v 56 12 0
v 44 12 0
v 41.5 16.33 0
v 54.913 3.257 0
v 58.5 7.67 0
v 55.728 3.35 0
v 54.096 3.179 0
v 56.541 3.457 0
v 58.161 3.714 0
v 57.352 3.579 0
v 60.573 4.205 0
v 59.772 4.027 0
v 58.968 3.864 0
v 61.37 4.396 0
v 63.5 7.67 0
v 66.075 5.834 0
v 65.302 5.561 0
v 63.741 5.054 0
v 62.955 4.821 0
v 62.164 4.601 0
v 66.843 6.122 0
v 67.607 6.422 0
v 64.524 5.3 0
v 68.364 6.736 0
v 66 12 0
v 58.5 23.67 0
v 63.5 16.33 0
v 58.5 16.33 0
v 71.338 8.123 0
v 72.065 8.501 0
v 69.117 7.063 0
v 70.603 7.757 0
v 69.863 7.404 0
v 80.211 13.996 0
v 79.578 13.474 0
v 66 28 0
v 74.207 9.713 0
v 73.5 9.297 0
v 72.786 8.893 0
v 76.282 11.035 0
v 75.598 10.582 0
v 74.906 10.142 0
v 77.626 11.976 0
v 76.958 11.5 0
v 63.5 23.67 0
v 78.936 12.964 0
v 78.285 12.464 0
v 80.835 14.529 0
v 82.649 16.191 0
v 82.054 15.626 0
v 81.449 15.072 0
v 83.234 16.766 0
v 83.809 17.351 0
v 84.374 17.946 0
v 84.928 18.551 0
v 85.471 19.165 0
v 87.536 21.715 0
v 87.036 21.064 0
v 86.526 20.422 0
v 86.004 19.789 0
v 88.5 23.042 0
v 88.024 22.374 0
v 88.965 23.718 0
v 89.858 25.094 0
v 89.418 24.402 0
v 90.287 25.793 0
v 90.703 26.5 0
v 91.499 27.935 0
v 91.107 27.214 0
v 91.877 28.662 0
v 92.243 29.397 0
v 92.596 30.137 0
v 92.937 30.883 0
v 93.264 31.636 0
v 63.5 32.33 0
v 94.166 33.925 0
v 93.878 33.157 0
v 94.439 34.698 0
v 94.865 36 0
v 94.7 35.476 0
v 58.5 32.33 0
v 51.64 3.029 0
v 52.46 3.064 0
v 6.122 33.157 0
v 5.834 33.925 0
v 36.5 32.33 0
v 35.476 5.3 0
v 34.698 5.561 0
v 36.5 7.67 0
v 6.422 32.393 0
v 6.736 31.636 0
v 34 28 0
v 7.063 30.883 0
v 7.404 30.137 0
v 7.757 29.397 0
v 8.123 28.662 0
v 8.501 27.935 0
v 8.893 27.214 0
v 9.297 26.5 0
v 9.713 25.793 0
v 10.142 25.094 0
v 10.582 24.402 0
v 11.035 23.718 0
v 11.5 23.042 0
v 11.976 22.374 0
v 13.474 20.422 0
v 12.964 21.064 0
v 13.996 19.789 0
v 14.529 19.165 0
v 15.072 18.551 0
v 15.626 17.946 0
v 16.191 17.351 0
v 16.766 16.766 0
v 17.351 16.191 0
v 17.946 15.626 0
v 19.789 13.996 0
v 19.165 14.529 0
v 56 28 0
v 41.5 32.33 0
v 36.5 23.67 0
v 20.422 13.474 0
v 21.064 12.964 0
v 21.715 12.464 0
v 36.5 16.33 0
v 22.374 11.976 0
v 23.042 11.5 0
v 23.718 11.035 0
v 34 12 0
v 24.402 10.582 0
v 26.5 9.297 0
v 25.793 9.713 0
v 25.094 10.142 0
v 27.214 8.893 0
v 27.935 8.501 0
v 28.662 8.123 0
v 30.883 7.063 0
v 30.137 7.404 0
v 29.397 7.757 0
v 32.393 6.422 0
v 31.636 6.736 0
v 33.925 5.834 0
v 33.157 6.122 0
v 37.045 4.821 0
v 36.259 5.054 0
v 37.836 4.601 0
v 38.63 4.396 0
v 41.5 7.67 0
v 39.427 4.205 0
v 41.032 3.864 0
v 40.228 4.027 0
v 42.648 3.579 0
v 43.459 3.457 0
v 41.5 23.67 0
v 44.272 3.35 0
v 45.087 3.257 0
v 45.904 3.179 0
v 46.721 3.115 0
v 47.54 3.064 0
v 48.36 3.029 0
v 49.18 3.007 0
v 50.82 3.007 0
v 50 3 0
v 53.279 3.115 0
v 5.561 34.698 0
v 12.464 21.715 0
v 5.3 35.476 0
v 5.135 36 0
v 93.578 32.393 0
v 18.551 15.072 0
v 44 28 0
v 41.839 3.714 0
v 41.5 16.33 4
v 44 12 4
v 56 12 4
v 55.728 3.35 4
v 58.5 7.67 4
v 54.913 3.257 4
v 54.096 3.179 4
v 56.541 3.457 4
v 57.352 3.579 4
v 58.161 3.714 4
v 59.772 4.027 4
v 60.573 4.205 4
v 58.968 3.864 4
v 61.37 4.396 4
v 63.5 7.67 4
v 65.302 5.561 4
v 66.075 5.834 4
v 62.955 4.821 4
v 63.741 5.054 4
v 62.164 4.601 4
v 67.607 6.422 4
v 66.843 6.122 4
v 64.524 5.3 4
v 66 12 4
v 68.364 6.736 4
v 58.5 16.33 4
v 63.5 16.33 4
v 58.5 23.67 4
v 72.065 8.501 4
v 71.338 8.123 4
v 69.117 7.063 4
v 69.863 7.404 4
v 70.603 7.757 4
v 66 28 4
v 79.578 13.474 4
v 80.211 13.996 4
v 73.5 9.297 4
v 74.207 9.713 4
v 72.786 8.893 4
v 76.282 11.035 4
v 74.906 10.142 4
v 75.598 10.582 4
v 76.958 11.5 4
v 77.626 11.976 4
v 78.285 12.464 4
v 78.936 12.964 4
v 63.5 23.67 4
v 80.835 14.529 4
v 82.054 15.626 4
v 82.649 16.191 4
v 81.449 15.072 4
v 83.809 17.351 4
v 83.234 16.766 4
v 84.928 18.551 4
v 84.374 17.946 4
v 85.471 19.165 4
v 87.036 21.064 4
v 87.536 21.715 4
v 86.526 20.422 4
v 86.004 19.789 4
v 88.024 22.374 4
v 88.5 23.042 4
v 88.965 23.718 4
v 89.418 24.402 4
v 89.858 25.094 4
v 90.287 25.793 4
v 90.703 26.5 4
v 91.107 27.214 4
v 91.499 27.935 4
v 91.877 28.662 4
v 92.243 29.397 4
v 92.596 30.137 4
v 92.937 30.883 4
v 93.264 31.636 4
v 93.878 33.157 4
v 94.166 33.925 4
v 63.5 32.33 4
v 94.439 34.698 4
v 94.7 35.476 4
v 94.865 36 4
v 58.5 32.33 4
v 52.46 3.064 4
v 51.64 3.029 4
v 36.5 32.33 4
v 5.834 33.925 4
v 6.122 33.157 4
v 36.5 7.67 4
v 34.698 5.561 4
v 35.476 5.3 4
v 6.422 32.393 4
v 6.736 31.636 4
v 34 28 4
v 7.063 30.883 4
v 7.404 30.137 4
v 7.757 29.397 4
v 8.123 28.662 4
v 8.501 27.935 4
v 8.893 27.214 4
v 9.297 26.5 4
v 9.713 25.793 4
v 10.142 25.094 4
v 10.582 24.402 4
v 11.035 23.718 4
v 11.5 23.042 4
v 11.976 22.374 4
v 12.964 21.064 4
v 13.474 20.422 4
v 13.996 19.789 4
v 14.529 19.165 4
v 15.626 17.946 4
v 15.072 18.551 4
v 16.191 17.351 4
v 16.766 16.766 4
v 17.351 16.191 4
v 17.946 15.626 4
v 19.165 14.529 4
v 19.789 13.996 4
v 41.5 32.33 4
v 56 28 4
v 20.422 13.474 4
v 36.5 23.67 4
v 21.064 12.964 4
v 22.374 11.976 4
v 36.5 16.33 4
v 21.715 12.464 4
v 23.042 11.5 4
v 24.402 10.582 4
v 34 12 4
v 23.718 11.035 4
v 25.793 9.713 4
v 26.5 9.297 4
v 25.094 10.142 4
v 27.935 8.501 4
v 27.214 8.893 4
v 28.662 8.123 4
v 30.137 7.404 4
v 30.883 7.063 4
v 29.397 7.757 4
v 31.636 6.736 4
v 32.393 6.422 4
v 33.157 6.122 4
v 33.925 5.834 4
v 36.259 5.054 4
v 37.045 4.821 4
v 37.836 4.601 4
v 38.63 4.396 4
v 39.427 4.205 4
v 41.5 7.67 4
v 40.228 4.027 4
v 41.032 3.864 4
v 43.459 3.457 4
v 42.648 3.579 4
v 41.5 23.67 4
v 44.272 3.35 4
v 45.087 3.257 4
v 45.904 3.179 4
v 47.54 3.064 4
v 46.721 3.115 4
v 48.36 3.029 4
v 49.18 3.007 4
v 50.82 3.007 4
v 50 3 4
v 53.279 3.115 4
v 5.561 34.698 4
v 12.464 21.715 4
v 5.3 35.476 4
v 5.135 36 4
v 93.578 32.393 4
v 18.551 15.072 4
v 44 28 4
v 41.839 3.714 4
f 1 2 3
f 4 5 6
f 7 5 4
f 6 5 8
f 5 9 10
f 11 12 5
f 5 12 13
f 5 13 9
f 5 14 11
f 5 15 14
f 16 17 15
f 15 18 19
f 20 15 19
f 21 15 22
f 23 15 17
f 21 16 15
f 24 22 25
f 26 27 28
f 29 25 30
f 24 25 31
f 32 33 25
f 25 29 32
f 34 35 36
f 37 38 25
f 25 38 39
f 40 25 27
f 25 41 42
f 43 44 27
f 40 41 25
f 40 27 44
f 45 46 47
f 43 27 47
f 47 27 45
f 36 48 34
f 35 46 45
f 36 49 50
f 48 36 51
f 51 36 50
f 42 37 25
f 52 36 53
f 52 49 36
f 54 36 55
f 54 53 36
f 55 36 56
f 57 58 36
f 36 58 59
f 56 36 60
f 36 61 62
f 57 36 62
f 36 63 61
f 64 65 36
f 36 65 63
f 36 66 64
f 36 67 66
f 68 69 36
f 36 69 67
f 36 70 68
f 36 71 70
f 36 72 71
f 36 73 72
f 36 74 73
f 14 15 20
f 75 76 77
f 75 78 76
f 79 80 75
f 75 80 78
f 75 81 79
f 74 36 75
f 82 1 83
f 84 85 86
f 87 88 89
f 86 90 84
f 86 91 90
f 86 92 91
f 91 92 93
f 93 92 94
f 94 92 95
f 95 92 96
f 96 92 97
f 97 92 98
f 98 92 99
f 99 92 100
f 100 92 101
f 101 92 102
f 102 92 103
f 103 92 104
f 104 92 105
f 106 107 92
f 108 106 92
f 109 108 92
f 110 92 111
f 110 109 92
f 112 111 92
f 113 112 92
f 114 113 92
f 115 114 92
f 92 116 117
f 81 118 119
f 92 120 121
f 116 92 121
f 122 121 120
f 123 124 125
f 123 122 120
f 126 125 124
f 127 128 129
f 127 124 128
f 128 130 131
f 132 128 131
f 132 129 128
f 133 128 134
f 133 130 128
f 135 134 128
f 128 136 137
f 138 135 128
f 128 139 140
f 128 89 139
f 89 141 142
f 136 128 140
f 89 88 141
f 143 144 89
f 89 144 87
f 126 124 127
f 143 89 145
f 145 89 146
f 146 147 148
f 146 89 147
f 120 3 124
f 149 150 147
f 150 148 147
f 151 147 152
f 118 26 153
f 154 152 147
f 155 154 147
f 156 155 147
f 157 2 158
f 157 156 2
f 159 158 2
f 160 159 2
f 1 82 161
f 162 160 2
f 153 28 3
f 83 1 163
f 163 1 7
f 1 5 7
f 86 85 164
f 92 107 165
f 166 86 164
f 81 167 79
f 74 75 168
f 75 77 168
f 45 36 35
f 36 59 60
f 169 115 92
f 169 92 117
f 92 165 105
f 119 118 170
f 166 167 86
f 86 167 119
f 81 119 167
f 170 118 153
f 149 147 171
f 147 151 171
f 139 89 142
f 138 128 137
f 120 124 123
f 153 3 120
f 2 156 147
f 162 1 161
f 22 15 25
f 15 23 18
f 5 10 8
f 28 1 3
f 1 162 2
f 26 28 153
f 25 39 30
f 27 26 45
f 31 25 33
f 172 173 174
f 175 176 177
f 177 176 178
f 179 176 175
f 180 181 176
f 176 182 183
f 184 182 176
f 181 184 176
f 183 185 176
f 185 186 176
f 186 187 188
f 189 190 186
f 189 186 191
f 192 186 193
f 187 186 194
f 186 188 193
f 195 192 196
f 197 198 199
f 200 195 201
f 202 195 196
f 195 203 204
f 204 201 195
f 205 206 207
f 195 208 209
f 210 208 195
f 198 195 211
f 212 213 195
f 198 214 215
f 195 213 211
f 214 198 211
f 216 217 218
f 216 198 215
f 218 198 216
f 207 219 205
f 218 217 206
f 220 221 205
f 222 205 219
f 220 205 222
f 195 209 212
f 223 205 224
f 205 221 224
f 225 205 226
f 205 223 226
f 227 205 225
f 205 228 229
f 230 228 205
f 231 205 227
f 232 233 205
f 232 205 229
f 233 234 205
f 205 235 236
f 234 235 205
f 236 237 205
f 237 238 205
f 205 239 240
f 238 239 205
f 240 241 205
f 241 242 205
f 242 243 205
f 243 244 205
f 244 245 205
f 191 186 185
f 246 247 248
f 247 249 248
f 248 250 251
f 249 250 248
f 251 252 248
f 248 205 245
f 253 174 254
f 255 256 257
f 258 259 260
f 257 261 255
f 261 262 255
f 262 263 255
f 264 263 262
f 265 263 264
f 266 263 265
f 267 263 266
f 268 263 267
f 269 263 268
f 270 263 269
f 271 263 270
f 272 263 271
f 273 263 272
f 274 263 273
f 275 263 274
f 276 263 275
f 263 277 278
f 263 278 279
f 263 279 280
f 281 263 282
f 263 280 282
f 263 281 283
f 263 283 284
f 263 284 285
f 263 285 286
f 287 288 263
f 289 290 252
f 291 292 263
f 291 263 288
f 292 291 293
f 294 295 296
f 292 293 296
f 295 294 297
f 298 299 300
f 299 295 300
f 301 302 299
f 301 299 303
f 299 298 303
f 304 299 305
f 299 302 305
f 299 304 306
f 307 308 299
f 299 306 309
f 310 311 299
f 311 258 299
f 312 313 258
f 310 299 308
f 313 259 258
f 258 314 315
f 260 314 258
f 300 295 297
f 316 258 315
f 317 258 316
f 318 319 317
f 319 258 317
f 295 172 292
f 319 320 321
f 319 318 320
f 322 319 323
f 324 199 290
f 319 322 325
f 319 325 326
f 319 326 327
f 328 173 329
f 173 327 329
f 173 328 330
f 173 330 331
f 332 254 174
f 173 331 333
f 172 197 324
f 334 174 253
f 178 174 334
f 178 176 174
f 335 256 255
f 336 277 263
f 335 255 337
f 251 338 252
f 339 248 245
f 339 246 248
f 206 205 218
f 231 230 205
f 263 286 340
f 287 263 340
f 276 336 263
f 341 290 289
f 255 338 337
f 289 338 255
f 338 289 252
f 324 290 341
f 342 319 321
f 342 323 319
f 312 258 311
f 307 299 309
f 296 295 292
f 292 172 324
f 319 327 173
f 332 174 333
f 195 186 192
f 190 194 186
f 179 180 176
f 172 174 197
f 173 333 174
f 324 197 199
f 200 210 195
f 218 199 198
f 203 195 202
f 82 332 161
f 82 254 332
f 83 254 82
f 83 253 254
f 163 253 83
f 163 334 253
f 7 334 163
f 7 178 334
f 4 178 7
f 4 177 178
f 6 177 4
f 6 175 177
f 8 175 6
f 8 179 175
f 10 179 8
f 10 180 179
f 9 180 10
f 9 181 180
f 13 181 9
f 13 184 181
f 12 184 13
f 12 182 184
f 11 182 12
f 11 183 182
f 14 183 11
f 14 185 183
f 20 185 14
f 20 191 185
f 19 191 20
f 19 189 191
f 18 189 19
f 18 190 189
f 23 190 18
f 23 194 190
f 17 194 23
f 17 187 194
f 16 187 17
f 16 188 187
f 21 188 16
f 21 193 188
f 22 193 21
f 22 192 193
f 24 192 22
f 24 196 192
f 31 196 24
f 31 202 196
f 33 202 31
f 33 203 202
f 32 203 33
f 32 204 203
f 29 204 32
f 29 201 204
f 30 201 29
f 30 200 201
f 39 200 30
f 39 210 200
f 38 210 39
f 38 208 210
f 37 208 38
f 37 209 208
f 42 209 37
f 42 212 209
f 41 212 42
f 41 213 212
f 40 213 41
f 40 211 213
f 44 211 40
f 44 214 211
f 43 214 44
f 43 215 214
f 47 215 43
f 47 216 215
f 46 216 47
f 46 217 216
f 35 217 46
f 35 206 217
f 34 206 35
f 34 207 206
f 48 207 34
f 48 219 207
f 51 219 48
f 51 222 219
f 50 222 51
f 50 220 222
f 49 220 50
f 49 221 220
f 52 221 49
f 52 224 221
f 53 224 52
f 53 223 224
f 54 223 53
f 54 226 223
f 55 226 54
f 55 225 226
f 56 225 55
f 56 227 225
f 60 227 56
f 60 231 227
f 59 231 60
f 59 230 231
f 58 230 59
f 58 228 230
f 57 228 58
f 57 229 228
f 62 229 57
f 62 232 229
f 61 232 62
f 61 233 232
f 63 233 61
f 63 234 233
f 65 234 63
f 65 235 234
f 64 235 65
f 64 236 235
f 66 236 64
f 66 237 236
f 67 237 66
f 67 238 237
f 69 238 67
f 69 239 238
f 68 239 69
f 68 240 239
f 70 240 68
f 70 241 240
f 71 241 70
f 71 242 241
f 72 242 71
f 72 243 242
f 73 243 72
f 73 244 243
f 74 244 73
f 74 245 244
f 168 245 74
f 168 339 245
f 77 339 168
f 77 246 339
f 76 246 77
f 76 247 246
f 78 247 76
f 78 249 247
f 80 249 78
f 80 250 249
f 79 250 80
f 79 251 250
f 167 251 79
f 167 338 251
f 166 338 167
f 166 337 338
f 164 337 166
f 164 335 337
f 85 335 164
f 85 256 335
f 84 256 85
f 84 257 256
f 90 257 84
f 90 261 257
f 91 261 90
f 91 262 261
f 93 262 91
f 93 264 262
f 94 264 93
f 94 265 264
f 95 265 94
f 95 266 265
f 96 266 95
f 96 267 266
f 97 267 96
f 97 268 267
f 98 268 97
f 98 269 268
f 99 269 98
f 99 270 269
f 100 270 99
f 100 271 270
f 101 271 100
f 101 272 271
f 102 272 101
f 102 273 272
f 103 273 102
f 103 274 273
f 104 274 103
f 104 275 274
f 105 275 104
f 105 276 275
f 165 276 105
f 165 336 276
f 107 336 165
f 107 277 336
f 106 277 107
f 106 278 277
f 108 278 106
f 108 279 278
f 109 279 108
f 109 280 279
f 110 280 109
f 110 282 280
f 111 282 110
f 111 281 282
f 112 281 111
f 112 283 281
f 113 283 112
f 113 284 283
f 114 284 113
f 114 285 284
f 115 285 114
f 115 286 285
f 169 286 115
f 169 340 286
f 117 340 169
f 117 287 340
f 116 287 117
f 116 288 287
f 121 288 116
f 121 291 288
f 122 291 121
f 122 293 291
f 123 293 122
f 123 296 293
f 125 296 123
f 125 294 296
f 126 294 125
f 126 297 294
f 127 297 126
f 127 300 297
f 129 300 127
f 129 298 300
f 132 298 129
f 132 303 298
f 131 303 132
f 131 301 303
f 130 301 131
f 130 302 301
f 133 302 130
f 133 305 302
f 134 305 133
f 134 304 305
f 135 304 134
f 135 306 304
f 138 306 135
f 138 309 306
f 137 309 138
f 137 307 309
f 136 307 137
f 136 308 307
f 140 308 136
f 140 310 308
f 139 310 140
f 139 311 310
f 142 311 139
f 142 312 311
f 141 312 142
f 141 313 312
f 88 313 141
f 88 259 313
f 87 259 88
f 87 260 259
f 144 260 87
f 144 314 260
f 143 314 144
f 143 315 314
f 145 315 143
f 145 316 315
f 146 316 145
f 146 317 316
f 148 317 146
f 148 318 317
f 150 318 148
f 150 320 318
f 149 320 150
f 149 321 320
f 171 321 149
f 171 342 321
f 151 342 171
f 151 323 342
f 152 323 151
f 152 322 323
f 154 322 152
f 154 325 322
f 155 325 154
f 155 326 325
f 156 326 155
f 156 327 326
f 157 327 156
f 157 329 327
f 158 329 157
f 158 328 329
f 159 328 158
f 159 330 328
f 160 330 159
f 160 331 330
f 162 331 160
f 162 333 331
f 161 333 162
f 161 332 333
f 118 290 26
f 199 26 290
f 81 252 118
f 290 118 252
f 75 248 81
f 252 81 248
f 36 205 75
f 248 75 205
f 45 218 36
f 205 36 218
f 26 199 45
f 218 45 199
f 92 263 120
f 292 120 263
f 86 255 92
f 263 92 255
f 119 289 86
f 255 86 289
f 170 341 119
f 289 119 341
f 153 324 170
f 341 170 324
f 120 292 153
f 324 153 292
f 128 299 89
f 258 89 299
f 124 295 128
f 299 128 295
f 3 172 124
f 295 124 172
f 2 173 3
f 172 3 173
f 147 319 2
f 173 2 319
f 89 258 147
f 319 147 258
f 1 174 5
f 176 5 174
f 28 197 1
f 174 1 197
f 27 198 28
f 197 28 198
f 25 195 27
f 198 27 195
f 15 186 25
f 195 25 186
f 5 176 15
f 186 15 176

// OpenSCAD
// file: 1A.1.scad
/* Copyright 2018 Guillaume JORANDON
 * 
 * This file is distributed under the terms of the MIT License.
 * Check https://opensource.org/licenses/MIT for more details.
 * 
 * ./front_core/1A.1.scad: back plate attached to the front of the rear core.
 *
 * quantity: 1
 * NB.: units are assumed to be millimeters.
 */

include <../globals.scad>
include <globals.scad>

module front_core_lip() {
    translate([-front_core_width/2, 0, 0]) {
        square([front_core_lip_reduction/2 + front_core_lip_inner_slope, front_core_partial_height-(front_core_width/2)]);
        translate([0, front_core_partial_height-(front_core_width/2), 0]) {
            polygon([[0, 0], [front_core_lip_reduction/2, 0], [front_core_lip_reduction/2, front_core_lip_height]]);
            polygon([[front_core_lip_reduction/2, 0], [front_core_lip_reduction/2 + front_core_lip_inner_slope, 0], [front_core_lip_reduction/2, front_core_lip_height]]);
        }
    }
}

module front_core_lips() {
    front_core_lip();
    mirror([1, 0, 0]) front_core_lip();
}

module front_core_1A_1_base() {
    translate([front_core_width/2, front_core_width/2, 0]) {
        difference() {
            circle(front_core_width/2);
            union() {
                translate([-(front_core_width-front_core_lip_reduction)/2+front_core_lip_inner_slope, -front_core_width/2 + front_core_inner_floor_height, 0]) square([front_core_width-front_core_lip_reduction-2*front_core_lip_inner_slope, front_core_width/2 - front_core_inner_floor_height]);
                translate([-front_core_width/2, 0, 0]) square([front_core_width, front_core_width/2]);
            }
        }
        front_core_lips();
    }
}

module front_core_tube_cut() {
    translate([front_core_width/2, front_core_width/2, 0]) {
        difference() {
            circle(front_core_width/2);
            union() {
                translate([-front_core_width/2, 0, 0]) square([front_core_width, front_core_width/2]);
                circle((front_core_width/2)-front_core_lower_tube_thickness);
            }
        }
    }
}

module front_core_floor_attaching_hole() {
    translate([front_core_floor_hole_distance/2, 0, 0]) square([front_core_floor_hole, sheet_thickness]);
}

module front_core_floor_attaching_holes() {
    union() {
        translate([front_core_width/2, front_core_inner_floor_height-sheet_thickness, 0]) {
            mirror([1, 0, 0]) front_core_floor_attaching_hole();
            front_core_floor_attaching_hole();
        }
    }
}

module front_core_inner_walls_attaching_hole() {
    translate([front_core_width/2 - front_core_lip_reduction/2 - front_core_lip_inner_slope, 0, 0]) square([sheet_thickness, front_core_inner_walls_hole]);
}

module front_core_inner_walls_attaching_holes() {
    union() {
        translate([front_core_width/2, front_core_inner_floor_height + (front_core_partial_height-front_core_inner_floor_height- front_core_inner_walls_hole)/2, 0]) {
            mirror([1, 0, 0]) front_core_inner_walls_attaching_hole();
            front_core_inner_walls_attaching_hole();
        }
    }
}

module front_core_junction_hole() {
    translate([11, 8, 0]) circle(front_core_junction_hole_diameter/2);
}

module front_core_junction_holes() {
    translate([front_core_width/2, 20, 0]) {
        front_core_junction_hole();
        rotate([0, 0, 180]) front_core_junction_hole();
        rotate([180, 0, 0]) front_core_junction_hole();
        rotate([0, 180, 0]) front_core_junction_hole();
    }
}

module front_core_1A_1() {
    difference() { 
        front_core_1A_1_base();
        union() {
            front_core_tube_cut();
            front_core_floor_attaching_holes();
            front_core_inner_walls_attaching_holes();
            front_core_junction_holes();
        }
    }
}

linear_extrude(sheet_thickness) front_core_1A_1();
// file: globals.scad
/* Copyright 2018 Guillaume JORANDON
 * 
 * This file is distributed under the terms of the MIT License.
 * Check https://opensource.org/licenses/MIT for more details.
 * 
 * ./front_core/globals.scad: global variables that apply to pieces from the front core.
 *
 * NB.: units are assumed to be millimeters.
 */

include <../globals.scad>

/* Total height of the front core */
front_core_height = 128;
/* Total length of the front core */
front_core_length = 161;
/* Total width of the front core */
front_core_width = 100;
/* height from bottom to the first lip */
front_core_partial_height = 61;
/* height from bottom of the piece to the top of the inner floor */
front_core_inner_floor_height = 40;
/* relative height between the bottom and the top of the lip */
front_core_lip_height = 4;
/* how much the lip reduces the inner core container */
front_core_lip_reduction = 16;
/* distance from the tubular core (including the back border) to the bottom of the piece */
front_core_tube_elevation = 42;
/* outer diameter of the transparent tubular core */
front_core_tube_diameter = 55;
/* size of the back border of the transparent core */
front_core_tube_back_border_size = 5;
/* lip inner slope width */
front_core_lip_inner_slope = 5;
/* thickness of the PVC tube for the lower part of the front core */
front_core_lower_tube_thickness = 3;
/* thickness of the transparent center core */
front_core_center_core_thickness = 3;
/* length of the center core tube, including the extra space in the rear core, and the extra space on the front */
front_core_center_core_length = 117 + 2*sheet_thickness;
/* distance from the front of the piece */
front_core_center_core_offset = 44;
/* length of holes to attach the floor of the piece */
front_core_floor_hole = 10;
/* distance between the two attaching holes of the floor */
front_core_floor_hole_distance = 24;
/* length of holes to attach the inner walls of the piece */
front_core_inner_walls_hole = front_core_floor_hole;
/* hole of the junction screws */
front_core_junction_hole_diameter = 5;
/* hole of the junction nuts */
front_core_junction_nut_diameter = front_core_junction_hole_diameter*2;
/* length of the front core if we remove the junction with 1B */
front_core_partial_length = 110 + 2*sheet_thickness;
// file: ../globals.scad
/* Copyright 2018 Guillaume JORANDON
 * 
 * This file is distributed under the terms of the MIT License.
 * Check https://opensource.org/licenses/MIT for more details.
 * 
 * ./globals.scad: some global variables that apply to every piece.
 *
 * NB.: units are assumed to be millimeters.
 */

/*Thickness of laser cutted sheets */
sheet_thickness = 4;
/* Margin on the printsheet */
print_margin = 3;
/* Curves accuracy */
$fn = 360;

/* Distance between the border of the bottom of the frontest plate of the rear_core and the bottom of the front core */
cores_offset = 16;
// main file
/* Copyright 2018 Guillaume JORANDON
 * 
 * This file is distributed under the terms of the MIT License.
 * Check https://opensource.org/licenses/MIT for more details.
 * 
 * ./front_core/1A.2.scad: nut plate to attach the front and the rear core.
 *
 * quantity: 1
 * NB.: units are assumed to be millimeters.
 */

include <../globals.scad>
include <globals.scad>
use <1A.1.scad>

module front_core_junction_nut() {
    translate([11, 8, 0]) circle(front_core_junction_nut_diameter/2, $fn=6);
}

module front_core_junction_nuts() {
    translate([front_core_width/2, 20, 0]) {
        front_core_junction_nut();
        rotate([0, 0, 180]) front_core_junction_nut();
        rotate([180, 0, 0]) front_core_junction_nut();
        rotate([0, 180, 0]) front_core_junction_nut();
    }
}

module front_core_1A_2() {
    difference() { 
        front_core_1A_1();
        union() {
            translate([0, front_core_inner_floor_height-sheet_thickness, 0]) square([front_core_width, front_core_width/2]);
            front_core_junction_nuts();
        }
    }
}

linear_extrude(sheet_thickness) front_core_1A_2();
